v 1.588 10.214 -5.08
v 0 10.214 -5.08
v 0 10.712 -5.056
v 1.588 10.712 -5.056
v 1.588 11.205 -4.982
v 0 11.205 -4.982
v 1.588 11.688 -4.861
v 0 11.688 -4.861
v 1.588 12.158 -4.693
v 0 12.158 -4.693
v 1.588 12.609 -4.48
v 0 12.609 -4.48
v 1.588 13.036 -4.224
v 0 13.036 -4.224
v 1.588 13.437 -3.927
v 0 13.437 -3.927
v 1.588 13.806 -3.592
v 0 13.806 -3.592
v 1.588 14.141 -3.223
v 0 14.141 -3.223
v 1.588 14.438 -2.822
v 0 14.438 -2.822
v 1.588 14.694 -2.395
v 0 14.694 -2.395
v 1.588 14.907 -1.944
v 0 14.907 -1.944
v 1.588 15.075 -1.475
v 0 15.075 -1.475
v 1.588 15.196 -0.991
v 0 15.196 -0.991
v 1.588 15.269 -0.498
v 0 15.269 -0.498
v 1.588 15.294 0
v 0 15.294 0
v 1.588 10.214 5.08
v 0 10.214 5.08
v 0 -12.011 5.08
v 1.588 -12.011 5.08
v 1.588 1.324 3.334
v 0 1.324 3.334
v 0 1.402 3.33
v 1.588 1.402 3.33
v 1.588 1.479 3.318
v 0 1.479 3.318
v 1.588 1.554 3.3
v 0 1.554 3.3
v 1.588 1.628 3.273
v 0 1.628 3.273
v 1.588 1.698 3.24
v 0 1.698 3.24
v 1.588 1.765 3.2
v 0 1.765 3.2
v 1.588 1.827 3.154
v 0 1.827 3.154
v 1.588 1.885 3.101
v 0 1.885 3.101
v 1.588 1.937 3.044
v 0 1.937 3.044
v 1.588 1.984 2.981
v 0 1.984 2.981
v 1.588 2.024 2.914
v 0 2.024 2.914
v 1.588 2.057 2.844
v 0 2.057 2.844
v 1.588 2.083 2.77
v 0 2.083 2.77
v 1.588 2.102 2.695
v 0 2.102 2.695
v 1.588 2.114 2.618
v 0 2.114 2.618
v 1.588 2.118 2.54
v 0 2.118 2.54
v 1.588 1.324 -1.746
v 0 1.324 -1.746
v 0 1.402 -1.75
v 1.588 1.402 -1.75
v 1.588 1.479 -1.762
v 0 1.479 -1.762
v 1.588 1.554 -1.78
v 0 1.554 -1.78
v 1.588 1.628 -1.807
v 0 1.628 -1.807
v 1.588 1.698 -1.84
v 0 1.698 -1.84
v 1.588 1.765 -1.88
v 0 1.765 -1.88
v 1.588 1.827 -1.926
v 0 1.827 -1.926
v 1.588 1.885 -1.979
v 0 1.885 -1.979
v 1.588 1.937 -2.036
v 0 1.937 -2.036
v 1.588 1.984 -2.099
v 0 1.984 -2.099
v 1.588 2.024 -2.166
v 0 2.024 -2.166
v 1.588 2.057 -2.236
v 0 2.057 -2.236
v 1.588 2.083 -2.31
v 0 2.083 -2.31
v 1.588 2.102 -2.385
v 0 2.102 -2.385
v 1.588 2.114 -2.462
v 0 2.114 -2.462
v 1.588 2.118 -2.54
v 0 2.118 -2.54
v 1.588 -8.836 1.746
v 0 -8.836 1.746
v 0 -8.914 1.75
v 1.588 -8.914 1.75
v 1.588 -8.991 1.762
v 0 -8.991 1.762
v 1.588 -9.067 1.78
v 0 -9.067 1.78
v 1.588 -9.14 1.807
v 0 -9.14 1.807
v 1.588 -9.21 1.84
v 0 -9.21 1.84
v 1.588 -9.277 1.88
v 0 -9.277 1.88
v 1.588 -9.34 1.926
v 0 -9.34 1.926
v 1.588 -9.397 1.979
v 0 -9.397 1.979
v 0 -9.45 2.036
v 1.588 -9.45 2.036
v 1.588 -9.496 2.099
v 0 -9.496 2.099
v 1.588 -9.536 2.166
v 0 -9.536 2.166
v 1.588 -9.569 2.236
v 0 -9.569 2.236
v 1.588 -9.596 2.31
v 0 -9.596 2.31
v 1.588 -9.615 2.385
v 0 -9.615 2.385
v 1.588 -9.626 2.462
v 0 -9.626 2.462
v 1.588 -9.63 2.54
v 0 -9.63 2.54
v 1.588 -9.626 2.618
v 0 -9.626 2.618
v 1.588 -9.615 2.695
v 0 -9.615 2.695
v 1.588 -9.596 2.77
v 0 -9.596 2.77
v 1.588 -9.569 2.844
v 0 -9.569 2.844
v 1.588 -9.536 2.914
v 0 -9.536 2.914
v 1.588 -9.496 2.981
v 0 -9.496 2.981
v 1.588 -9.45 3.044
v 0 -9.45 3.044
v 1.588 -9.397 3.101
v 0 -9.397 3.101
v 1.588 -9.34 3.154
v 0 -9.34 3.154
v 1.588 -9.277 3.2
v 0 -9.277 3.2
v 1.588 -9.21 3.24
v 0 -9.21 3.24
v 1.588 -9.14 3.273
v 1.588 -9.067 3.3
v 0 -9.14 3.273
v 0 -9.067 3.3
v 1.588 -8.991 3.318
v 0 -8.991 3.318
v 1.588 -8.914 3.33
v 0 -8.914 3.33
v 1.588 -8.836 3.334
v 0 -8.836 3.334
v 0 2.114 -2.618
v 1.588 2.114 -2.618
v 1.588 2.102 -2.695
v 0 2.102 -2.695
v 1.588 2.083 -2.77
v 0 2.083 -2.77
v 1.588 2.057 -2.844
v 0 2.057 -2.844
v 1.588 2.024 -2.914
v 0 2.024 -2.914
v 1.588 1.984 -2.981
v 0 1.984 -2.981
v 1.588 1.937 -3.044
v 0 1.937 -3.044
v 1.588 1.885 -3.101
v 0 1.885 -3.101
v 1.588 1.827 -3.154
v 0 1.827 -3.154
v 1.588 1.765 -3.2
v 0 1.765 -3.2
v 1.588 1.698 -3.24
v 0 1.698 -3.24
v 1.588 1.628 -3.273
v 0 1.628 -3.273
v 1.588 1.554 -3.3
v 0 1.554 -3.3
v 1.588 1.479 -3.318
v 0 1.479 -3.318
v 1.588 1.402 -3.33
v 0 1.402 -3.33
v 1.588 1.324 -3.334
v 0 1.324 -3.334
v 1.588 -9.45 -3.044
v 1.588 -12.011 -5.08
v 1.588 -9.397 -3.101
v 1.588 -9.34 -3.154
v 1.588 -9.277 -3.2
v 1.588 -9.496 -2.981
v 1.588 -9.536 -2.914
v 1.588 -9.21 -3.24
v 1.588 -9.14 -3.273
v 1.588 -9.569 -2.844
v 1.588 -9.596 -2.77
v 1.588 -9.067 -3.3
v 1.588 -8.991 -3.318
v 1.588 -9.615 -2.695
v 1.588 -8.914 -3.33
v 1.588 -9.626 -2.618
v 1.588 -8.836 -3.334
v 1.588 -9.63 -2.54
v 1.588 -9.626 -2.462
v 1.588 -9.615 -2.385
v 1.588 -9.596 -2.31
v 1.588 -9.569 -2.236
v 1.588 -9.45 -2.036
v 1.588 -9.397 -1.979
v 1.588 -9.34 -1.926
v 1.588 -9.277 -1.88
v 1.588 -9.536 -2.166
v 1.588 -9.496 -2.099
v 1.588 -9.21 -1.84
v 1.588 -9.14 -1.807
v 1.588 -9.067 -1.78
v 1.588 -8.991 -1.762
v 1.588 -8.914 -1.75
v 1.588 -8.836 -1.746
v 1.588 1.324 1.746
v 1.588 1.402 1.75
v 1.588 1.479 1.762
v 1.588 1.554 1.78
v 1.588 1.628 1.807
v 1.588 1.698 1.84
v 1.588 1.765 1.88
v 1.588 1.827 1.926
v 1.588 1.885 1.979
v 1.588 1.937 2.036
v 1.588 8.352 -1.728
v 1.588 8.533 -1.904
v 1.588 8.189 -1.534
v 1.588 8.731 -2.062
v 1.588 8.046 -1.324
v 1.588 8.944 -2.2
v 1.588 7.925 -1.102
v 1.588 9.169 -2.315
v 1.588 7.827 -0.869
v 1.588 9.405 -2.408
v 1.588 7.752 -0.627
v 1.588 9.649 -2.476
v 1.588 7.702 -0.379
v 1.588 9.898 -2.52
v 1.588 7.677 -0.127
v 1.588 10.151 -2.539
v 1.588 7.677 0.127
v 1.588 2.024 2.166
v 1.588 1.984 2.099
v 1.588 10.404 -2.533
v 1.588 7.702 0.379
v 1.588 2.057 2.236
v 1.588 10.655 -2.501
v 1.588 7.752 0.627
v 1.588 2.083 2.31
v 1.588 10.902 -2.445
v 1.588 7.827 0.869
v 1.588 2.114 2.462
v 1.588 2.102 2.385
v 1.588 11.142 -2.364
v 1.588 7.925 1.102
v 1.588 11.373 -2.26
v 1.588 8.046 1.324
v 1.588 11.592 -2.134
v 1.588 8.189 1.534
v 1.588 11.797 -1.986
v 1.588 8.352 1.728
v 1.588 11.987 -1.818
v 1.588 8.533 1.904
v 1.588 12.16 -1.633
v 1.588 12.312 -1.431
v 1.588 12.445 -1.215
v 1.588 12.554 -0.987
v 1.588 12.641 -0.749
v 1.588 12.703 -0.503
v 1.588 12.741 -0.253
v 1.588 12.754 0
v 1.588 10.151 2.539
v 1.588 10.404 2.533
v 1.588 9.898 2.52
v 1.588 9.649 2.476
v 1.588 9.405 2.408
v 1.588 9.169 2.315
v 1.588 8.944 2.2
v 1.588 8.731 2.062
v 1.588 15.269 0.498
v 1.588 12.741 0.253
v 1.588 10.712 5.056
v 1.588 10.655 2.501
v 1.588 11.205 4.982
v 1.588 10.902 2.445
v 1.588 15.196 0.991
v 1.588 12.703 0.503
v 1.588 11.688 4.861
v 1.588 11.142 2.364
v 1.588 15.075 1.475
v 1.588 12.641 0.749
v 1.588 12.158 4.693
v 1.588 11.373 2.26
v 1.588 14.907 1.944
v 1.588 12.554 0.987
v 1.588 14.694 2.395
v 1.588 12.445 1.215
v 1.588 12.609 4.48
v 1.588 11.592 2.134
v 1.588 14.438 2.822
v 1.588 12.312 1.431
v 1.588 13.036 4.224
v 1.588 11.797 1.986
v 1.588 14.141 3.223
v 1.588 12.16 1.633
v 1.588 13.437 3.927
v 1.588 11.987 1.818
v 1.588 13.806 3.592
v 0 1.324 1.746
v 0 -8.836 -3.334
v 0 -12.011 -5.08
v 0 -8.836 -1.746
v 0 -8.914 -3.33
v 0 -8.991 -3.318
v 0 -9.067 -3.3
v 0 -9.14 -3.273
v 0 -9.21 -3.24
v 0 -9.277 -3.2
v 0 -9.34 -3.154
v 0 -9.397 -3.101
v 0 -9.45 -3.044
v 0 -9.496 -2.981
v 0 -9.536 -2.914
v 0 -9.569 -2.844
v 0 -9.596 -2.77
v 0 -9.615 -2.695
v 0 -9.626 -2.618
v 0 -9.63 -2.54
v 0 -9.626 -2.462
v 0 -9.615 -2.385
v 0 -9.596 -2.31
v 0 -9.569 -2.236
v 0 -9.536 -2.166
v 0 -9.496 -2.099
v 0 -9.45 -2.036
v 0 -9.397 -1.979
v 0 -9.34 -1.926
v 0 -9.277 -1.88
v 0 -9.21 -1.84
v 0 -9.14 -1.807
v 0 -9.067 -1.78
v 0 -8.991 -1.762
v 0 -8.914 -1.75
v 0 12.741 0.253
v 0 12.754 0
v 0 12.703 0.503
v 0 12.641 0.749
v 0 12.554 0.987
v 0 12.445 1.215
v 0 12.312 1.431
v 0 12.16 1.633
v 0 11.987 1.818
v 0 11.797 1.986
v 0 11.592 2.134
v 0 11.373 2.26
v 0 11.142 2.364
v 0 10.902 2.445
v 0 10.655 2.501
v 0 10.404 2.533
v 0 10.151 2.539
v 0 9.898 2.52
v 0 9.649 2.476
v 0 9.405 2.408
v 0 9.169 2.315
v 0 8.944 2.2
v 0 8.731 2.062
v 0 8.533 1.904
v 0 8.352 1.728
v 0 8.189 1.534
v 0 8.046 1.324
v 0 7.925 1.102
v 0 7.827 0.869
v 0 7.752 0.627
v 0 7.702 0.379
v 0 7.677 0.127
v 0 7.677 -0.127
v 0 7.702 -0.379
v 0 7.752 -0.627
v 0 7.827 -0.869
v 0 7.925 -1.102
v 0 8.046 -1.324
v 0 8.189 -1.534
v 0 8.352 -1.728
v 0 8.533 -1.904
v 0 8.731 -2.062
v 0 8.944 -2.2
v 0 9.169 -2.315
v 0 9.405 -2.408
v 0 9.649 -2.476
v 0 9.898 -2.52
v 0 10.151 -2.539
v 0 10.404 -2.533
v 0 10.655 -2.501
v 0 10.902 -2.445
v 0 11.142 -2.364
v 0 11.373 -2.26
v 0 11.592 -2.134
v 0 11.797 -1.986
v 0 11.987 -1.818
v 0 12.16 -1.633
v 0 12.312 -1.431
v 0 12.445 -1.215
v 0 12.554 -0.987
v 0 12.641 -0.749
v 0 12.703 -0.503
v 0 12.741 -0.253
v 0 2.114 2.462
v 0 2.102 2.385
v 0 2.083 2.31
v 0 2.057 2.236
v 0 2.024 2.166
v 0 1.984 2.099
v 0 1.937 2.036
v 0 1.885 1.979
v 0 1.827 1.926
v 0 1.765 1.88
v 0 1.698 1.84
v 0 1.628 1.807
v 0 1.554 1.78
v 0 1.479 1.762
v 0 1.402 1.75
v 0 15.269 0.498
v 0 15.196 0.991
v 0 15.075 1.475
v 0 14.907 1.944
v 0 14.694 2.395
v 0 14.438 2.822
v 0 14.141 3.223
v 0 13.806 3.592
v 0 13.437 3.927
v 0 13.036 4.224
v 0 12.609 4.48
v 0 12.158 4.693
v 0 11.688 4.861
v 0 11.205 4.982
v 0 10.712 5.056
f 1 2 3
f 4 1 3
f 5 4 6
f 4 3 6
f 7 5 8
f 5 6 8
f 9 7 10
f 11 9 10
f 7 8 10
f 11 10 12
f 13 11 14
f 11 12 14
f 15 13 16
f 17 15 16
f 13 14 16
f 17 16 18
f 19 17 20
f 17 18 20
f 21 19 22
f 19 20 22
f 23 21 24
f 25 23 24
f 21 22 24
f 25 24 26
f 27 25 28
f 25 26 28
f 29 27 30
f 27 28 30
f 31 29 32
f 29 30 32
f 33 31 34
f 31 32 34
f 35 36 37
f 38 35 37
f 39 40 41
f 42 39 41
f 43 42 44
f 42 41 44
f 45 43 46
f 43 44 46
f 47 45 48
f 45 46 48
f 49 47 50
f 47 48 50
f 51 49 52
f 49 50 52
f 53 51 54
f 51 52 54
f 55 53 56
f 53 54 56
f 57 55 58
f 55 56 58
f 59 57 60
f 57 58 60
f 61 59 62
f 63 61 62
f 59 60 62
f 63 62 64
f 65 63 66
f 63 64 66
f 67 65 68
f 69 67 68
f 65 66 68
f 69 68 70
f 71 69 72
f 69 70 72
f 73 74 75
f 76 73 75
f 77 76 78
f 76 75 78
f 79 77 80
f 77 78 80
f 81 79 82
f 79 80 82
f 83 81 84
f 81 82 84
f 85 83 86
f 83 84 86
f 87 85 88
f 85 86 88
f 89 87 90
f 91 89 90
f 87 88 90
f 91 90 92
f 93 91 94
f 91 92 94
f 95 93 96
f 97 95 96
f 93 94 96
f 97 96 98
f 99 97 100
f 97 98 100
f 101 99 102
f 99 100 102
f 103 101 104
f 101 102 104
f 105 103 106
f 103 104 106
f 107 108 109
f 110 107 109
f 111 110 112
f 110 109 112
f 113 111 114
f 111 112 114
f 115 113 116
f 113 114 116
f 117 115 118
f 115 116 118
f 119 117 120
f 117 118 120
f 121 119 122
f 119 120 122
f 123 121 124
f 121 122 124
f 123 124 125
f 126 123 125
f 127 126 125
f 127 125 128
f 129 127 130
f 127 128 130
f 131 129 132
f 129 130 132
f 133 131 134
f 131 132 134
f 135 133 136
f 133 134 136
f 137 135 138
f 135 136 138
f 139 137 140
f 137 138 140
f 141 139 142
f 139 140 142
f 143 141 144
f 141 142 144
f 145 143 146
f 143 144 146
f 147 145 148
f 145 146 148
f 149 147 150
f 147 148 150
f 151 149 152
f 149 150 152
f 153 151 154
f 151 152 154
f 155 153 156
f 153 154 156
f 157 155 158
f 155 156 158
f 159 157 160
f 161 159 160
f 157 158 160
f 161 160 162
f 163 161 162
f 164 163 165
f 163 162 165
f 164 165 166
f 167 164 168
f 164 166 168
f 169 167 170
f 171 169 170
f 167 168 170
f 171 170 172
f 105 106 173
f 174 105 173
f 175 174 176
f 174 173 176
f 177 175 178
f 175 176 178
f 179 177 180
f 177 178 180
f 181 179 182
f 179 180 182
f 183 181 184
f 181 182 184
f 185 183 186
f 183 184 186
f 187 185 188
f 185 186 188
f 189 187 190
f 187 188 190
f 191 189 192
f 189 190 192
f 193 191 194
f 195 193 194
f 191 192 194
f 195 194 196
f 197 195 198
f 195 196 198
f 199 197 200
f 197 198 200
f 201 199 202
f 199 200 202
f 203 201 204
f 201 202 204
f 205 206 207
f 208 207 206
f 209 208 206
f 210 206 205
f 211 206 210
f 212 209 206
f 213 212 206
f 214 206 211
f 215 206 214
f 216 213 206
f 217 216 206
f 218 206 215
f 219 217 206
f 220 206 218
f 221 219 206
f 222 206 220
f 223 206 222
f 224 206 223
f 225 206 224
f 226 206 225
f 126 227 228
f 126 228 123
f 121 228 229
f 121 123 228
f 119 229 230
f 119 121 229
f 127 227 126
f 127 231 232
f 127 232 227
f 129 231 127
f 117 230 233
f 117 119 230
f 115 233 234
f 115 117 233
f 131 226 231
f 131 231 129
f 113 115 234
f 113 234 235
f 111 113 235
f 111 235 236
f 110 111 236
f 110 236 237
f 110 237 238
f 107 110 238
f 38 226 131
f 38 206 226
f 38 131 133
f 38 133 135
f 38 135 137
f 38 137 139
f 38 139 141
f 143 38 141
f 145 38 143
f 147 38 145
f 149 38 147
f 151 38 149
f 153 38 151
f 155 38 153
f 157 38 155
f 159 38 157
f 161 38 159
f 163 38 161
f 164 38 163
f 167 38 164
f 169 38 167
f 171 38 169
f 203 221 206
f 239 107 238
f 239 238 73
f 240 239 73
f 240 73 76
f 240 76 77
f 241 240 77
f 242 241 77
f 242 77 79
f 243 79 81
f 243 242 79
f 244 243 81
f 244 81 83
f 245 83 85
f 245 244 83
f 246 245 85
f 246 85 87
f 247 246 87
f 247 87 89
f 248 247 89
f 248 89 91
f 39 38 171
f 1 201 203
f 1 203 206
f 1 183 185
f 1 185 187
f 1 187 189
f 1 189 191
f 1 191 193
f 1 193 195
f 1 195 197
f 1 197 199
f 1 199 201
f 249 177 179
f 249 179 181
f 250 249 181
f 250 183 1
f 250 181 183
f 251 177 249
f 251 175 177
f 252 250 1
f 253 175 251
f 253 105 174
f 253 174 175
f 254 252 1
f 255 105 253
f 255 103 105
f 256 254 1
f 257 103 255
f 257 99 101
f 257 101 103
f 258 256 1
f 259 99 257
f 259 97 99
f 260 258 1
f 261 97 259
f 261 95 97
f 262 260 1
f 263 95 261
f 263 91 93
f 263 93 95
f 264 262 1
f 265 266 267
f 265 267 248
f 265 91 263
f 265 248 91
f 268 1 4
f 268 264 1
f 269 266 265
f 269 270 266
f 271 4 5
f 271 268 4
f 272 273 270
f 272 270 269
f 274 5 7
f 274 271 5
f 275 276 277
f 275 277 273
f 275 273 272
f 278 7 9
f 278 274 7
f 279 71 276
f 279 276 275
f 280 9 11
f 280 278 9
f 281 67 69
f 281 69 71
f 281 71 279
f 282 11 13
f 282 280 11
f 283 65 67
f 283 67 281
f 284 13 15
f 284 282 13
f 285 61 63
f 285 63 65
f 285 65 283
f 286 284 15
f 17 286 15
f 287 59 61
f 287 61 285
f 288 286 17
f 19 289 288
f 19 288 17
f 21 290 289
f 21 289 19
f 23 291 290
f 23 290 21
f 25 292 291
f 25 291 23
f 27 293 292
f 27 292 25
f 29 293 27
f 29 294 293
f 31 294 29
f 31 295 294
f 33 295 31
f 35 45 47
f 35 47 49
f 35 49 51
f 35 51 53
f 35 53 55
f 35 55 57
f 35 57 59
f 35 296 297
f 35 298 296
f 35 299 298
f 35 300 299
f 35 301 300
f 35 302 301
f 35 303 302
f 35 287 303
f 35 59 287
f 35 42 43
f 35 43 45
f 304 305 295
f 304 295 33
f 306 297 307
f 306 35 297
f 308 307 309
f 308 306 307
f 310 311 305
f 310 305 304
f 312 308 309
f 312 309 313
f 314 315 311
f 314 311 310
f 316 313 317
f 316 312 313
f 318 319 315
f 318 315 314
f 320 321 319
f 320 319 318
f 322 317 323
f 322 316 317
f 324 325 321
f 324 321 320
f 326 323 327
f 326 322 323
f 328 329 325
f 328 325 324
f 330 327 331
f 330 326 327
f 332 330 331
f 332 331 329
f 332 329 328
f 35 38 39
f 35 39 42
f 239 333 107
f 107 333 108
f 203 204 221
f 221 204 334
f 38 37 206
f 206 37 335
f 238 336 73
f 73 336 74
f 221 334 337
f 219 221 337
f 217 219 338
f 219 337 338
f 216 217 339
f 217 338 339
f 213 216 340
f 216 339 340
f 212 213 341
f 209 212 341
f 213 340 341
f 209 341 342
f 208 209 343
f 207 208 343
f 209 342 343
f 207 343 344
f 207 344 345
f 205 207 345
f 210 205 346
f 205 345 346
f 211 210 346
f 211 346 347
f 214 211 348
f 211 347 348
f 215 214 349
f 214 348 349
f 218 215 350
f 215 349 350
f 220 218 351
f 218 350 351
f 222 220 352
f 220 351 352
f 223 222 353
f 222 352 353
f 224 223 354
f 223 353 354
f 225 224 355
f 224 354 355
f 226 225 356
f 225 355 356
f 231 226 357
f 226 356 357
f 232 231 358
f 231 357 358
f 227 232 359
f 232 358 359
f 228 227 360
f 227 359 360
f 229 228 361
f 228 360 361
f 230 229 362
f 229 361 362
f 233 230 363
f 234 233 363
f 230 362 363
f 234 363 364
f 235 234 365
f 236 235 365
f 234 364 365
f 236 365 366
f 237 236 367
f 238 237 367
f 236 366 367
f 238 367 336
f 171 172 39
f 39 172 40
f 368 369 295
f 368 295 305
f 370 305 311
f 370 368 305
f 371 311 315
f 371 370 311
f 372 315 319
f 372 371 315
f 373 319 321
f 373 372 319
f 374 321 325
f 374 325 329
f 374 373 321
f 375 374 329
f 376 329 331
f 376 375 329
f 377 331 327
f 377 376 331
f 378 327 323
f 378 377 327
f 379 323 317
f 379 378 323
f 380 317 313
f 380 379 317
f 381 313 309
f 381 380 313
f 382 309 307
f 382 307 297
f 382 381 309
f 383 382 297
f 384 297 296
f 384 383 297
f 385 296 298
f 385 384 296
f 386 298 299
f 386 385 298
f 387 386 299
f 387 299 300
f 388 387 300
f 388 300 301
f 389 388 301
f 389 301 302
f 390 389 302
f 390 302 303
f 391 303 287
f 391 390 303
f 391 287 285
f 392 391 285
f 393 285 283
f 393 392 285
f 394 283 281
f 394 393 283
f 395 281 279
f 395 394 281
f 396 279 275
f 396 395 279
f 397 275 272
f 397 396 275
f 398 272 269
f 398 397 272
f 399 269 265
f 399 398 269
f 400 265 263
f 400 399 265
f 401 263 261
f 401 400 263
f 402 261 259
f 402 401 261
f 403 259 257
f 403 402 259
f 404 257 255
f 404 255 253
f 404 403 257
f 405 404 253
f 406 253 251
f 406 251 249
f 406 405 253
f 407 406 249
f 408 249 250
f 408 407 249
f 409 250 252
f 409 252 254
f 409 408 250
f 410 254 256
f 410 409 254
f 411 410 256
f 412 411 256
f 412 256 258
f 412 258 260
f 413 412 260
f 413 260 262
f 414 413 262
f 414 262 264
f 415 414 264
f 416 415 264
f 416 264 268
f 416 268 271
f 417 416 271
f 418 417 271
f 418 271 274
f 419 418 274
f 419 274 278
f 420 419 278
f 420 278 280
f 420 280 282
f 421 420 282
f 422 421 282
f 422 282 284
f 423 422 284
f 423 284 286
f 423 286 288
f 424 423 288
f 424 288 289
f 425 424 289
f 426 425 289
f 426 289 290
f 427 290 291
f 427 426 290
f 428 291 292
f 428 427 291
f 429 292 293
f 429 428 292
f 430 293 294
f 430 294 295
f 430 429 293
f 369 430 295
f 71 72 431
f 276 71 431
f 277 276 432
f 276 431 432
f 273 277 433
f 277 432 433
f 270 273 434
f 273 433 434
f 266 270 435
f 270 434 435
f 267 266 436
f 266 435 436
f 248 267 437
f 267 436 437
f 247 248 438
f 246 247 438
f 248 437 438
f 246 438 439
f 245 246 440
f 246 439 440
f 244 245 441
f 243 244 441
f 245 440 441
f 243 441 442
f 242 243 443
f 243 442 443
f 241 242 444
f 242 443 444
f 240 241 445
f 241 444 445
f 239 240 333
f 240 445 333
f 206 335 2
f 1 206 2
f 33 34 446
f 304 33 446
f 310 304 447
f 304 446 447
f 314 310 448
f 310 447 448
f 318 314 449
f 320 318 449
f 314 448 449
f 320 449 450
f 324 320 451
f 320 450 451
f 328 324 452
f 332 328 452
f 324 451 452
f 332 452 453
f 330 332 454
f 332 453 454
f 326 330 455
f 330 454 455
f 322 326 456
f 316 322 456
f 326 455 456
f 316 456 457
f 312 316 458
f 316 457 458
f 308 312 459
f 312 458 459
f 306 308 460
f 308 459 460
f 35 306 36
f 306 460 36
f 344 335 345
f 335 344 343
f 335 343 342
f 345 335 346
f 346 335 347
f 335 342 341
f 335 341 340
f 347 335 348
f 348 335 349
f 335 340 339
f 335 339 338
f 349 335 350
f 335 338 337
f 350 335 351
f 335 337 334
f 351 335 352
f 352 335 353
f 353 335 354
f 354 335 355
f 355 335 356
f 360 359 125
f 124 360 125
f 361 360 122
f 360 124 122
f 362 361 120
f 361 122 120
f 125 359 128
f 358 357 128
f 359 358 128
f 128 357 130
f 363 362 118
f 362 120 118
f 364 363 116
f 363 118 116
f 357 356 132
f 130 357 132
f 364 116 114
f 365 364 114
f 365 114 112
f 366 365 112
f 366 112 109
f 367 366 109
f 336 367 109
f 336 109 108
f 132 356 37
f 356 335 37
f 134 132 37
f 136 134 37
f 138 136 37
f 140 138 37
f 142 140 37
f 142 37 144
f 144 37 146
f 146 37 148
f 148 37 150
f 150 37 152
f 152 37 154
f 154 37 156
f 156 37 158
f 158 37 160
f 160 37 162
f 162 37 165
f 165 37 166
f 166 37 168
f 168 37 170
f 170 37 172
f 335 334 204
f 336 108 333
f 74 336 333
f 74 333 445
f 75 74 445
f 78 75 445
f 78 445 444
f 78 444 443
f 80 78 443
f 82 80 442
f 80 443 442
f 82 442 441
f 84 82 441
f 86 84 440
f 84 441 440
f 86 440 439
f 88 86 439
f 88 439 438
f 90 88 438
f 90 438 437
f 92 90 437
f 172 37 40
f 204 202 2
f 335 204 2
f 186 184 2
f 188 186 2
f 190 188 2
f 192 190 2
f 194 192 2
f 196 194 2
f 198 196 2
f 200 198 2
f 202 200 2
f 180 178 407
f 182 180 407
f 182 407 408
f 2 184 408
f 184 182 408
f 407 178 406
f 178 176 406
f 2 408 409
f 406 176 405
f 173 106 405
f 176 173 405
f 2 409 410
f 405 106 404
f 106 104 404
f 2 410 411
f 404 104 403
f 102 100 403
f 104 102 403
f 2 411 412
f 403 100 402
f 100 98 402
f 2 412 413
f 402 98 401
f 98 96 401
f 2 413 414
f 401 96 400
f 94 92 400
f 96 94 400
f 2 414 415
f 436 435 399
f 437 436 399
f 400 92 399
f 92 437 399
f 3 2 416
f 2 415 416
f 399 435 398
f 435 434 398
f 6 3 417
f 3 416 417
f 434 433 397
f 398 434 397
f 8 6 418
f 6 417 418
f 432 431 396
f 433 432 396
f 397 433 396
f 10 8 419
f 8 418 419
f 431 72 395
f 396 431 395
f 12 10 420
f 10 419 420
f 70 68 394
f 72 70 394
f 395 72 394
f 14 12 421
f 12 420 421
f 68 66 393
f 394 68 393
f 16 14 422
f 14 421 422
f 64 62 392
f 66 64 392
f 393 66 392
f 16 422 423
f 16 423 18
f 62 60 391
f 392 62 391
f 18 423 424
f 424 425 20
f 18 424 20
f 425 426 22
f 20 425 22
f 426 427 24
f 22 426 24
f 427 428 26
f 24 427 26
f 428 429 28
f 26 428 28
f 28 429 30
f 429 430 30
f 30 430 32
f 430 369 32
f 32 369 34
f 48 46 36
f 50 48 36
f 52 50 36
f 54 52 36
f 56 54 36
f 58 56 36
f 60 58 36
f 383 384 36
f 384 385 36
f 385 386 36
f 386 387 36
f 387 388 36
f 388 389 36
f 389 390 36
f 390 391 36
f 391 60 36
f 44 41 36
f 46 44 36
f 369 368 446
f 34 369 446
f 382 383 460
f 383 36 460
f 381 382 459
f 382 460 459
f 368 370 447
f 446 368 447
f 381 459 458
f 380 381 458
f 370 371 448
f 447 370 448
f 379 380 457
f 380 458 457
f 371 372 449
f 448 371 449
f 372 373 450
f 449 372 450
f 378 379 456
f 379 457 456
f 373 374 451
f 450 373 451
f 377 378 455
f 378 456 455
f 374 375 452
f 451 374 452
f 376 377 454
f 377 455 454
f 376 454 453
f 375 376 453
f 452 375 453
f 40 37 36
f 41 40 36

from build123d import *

# Parameters (mm, degrees)
F0_R     = 2.54
F1_DEPTH = 1.5875


with BuildPart() as f1:
    # F0 (on Right) → F1 (new body)
    with BuildSketch(Plane.YZ):
        with BuildLine():
            Line((10.213834, 5.08), (-12.011166, 5.08))
            Line((-12.011166, 5.08), (-12.011166, -5.08))
            Line((-12.011166, -5.08), (10.213834, -5.08))
            ThreePointArc((10.213834, -5.08), (5.133834, 0), (10.213834, 5.08))
        make_face()
        with BuildLine():
            ThreePointArc((-8.836166, -3.33375), (-9.629916, -2.54), (-8.836166, -1.74625))
            Line((-8.836166, -1.74625), (1.323834, -1.74625))
            ThreePointArc((1.323834, -1.74625), (1.8851, -1.978734), (2.117584, -2.54))
            ThreePointArc((2.117584, -2.54), (1.8851, -3.101266), (1.323834, -3.33375))
            Line((1.323834, -3.33375), (-8.836166, -3.33375))
        make_face(mode=Mode.SUBTRACT)
        with BuildLine():
            ThreePointArc((-8.836166, 1.74625), (-9.629916, 2.54), (-8.836166, 3.33375))
            Line((-8.836166, 3.33375), (1.323834, 3.33375))
            ThreePointArc((1.323834, 3.33375), (1.8851, 3.101266), (2.117584, 2.54))
            ThreePointArc((2.117584, 2.54), (1.8851, 1.978734), (1.323834, 1.74625))
            Line((1.323834, 1.74625), (-8.836166, 1.74625))
        make_face(mode=Mode.SUBTRACT)
        with BuildLine():
            ThreePointArc((15.293834, 0), (13.805936, 3.592102), (10.213834, 5.08))
            ThreePointArc((10.213834, 5.08), (5.133834, 0), (10.213834, -5.08))
            ThreePointArc((10.213834, -5.08), (13.805936, -3.592102), (15.293834, 0))
        make_face()
        with Locations((10.213834, 0)):
            Circle(F0_R, mode=Mode.SUBTRACT)
    extrude(amount=F1_DEPTH)


solid = f1.part
